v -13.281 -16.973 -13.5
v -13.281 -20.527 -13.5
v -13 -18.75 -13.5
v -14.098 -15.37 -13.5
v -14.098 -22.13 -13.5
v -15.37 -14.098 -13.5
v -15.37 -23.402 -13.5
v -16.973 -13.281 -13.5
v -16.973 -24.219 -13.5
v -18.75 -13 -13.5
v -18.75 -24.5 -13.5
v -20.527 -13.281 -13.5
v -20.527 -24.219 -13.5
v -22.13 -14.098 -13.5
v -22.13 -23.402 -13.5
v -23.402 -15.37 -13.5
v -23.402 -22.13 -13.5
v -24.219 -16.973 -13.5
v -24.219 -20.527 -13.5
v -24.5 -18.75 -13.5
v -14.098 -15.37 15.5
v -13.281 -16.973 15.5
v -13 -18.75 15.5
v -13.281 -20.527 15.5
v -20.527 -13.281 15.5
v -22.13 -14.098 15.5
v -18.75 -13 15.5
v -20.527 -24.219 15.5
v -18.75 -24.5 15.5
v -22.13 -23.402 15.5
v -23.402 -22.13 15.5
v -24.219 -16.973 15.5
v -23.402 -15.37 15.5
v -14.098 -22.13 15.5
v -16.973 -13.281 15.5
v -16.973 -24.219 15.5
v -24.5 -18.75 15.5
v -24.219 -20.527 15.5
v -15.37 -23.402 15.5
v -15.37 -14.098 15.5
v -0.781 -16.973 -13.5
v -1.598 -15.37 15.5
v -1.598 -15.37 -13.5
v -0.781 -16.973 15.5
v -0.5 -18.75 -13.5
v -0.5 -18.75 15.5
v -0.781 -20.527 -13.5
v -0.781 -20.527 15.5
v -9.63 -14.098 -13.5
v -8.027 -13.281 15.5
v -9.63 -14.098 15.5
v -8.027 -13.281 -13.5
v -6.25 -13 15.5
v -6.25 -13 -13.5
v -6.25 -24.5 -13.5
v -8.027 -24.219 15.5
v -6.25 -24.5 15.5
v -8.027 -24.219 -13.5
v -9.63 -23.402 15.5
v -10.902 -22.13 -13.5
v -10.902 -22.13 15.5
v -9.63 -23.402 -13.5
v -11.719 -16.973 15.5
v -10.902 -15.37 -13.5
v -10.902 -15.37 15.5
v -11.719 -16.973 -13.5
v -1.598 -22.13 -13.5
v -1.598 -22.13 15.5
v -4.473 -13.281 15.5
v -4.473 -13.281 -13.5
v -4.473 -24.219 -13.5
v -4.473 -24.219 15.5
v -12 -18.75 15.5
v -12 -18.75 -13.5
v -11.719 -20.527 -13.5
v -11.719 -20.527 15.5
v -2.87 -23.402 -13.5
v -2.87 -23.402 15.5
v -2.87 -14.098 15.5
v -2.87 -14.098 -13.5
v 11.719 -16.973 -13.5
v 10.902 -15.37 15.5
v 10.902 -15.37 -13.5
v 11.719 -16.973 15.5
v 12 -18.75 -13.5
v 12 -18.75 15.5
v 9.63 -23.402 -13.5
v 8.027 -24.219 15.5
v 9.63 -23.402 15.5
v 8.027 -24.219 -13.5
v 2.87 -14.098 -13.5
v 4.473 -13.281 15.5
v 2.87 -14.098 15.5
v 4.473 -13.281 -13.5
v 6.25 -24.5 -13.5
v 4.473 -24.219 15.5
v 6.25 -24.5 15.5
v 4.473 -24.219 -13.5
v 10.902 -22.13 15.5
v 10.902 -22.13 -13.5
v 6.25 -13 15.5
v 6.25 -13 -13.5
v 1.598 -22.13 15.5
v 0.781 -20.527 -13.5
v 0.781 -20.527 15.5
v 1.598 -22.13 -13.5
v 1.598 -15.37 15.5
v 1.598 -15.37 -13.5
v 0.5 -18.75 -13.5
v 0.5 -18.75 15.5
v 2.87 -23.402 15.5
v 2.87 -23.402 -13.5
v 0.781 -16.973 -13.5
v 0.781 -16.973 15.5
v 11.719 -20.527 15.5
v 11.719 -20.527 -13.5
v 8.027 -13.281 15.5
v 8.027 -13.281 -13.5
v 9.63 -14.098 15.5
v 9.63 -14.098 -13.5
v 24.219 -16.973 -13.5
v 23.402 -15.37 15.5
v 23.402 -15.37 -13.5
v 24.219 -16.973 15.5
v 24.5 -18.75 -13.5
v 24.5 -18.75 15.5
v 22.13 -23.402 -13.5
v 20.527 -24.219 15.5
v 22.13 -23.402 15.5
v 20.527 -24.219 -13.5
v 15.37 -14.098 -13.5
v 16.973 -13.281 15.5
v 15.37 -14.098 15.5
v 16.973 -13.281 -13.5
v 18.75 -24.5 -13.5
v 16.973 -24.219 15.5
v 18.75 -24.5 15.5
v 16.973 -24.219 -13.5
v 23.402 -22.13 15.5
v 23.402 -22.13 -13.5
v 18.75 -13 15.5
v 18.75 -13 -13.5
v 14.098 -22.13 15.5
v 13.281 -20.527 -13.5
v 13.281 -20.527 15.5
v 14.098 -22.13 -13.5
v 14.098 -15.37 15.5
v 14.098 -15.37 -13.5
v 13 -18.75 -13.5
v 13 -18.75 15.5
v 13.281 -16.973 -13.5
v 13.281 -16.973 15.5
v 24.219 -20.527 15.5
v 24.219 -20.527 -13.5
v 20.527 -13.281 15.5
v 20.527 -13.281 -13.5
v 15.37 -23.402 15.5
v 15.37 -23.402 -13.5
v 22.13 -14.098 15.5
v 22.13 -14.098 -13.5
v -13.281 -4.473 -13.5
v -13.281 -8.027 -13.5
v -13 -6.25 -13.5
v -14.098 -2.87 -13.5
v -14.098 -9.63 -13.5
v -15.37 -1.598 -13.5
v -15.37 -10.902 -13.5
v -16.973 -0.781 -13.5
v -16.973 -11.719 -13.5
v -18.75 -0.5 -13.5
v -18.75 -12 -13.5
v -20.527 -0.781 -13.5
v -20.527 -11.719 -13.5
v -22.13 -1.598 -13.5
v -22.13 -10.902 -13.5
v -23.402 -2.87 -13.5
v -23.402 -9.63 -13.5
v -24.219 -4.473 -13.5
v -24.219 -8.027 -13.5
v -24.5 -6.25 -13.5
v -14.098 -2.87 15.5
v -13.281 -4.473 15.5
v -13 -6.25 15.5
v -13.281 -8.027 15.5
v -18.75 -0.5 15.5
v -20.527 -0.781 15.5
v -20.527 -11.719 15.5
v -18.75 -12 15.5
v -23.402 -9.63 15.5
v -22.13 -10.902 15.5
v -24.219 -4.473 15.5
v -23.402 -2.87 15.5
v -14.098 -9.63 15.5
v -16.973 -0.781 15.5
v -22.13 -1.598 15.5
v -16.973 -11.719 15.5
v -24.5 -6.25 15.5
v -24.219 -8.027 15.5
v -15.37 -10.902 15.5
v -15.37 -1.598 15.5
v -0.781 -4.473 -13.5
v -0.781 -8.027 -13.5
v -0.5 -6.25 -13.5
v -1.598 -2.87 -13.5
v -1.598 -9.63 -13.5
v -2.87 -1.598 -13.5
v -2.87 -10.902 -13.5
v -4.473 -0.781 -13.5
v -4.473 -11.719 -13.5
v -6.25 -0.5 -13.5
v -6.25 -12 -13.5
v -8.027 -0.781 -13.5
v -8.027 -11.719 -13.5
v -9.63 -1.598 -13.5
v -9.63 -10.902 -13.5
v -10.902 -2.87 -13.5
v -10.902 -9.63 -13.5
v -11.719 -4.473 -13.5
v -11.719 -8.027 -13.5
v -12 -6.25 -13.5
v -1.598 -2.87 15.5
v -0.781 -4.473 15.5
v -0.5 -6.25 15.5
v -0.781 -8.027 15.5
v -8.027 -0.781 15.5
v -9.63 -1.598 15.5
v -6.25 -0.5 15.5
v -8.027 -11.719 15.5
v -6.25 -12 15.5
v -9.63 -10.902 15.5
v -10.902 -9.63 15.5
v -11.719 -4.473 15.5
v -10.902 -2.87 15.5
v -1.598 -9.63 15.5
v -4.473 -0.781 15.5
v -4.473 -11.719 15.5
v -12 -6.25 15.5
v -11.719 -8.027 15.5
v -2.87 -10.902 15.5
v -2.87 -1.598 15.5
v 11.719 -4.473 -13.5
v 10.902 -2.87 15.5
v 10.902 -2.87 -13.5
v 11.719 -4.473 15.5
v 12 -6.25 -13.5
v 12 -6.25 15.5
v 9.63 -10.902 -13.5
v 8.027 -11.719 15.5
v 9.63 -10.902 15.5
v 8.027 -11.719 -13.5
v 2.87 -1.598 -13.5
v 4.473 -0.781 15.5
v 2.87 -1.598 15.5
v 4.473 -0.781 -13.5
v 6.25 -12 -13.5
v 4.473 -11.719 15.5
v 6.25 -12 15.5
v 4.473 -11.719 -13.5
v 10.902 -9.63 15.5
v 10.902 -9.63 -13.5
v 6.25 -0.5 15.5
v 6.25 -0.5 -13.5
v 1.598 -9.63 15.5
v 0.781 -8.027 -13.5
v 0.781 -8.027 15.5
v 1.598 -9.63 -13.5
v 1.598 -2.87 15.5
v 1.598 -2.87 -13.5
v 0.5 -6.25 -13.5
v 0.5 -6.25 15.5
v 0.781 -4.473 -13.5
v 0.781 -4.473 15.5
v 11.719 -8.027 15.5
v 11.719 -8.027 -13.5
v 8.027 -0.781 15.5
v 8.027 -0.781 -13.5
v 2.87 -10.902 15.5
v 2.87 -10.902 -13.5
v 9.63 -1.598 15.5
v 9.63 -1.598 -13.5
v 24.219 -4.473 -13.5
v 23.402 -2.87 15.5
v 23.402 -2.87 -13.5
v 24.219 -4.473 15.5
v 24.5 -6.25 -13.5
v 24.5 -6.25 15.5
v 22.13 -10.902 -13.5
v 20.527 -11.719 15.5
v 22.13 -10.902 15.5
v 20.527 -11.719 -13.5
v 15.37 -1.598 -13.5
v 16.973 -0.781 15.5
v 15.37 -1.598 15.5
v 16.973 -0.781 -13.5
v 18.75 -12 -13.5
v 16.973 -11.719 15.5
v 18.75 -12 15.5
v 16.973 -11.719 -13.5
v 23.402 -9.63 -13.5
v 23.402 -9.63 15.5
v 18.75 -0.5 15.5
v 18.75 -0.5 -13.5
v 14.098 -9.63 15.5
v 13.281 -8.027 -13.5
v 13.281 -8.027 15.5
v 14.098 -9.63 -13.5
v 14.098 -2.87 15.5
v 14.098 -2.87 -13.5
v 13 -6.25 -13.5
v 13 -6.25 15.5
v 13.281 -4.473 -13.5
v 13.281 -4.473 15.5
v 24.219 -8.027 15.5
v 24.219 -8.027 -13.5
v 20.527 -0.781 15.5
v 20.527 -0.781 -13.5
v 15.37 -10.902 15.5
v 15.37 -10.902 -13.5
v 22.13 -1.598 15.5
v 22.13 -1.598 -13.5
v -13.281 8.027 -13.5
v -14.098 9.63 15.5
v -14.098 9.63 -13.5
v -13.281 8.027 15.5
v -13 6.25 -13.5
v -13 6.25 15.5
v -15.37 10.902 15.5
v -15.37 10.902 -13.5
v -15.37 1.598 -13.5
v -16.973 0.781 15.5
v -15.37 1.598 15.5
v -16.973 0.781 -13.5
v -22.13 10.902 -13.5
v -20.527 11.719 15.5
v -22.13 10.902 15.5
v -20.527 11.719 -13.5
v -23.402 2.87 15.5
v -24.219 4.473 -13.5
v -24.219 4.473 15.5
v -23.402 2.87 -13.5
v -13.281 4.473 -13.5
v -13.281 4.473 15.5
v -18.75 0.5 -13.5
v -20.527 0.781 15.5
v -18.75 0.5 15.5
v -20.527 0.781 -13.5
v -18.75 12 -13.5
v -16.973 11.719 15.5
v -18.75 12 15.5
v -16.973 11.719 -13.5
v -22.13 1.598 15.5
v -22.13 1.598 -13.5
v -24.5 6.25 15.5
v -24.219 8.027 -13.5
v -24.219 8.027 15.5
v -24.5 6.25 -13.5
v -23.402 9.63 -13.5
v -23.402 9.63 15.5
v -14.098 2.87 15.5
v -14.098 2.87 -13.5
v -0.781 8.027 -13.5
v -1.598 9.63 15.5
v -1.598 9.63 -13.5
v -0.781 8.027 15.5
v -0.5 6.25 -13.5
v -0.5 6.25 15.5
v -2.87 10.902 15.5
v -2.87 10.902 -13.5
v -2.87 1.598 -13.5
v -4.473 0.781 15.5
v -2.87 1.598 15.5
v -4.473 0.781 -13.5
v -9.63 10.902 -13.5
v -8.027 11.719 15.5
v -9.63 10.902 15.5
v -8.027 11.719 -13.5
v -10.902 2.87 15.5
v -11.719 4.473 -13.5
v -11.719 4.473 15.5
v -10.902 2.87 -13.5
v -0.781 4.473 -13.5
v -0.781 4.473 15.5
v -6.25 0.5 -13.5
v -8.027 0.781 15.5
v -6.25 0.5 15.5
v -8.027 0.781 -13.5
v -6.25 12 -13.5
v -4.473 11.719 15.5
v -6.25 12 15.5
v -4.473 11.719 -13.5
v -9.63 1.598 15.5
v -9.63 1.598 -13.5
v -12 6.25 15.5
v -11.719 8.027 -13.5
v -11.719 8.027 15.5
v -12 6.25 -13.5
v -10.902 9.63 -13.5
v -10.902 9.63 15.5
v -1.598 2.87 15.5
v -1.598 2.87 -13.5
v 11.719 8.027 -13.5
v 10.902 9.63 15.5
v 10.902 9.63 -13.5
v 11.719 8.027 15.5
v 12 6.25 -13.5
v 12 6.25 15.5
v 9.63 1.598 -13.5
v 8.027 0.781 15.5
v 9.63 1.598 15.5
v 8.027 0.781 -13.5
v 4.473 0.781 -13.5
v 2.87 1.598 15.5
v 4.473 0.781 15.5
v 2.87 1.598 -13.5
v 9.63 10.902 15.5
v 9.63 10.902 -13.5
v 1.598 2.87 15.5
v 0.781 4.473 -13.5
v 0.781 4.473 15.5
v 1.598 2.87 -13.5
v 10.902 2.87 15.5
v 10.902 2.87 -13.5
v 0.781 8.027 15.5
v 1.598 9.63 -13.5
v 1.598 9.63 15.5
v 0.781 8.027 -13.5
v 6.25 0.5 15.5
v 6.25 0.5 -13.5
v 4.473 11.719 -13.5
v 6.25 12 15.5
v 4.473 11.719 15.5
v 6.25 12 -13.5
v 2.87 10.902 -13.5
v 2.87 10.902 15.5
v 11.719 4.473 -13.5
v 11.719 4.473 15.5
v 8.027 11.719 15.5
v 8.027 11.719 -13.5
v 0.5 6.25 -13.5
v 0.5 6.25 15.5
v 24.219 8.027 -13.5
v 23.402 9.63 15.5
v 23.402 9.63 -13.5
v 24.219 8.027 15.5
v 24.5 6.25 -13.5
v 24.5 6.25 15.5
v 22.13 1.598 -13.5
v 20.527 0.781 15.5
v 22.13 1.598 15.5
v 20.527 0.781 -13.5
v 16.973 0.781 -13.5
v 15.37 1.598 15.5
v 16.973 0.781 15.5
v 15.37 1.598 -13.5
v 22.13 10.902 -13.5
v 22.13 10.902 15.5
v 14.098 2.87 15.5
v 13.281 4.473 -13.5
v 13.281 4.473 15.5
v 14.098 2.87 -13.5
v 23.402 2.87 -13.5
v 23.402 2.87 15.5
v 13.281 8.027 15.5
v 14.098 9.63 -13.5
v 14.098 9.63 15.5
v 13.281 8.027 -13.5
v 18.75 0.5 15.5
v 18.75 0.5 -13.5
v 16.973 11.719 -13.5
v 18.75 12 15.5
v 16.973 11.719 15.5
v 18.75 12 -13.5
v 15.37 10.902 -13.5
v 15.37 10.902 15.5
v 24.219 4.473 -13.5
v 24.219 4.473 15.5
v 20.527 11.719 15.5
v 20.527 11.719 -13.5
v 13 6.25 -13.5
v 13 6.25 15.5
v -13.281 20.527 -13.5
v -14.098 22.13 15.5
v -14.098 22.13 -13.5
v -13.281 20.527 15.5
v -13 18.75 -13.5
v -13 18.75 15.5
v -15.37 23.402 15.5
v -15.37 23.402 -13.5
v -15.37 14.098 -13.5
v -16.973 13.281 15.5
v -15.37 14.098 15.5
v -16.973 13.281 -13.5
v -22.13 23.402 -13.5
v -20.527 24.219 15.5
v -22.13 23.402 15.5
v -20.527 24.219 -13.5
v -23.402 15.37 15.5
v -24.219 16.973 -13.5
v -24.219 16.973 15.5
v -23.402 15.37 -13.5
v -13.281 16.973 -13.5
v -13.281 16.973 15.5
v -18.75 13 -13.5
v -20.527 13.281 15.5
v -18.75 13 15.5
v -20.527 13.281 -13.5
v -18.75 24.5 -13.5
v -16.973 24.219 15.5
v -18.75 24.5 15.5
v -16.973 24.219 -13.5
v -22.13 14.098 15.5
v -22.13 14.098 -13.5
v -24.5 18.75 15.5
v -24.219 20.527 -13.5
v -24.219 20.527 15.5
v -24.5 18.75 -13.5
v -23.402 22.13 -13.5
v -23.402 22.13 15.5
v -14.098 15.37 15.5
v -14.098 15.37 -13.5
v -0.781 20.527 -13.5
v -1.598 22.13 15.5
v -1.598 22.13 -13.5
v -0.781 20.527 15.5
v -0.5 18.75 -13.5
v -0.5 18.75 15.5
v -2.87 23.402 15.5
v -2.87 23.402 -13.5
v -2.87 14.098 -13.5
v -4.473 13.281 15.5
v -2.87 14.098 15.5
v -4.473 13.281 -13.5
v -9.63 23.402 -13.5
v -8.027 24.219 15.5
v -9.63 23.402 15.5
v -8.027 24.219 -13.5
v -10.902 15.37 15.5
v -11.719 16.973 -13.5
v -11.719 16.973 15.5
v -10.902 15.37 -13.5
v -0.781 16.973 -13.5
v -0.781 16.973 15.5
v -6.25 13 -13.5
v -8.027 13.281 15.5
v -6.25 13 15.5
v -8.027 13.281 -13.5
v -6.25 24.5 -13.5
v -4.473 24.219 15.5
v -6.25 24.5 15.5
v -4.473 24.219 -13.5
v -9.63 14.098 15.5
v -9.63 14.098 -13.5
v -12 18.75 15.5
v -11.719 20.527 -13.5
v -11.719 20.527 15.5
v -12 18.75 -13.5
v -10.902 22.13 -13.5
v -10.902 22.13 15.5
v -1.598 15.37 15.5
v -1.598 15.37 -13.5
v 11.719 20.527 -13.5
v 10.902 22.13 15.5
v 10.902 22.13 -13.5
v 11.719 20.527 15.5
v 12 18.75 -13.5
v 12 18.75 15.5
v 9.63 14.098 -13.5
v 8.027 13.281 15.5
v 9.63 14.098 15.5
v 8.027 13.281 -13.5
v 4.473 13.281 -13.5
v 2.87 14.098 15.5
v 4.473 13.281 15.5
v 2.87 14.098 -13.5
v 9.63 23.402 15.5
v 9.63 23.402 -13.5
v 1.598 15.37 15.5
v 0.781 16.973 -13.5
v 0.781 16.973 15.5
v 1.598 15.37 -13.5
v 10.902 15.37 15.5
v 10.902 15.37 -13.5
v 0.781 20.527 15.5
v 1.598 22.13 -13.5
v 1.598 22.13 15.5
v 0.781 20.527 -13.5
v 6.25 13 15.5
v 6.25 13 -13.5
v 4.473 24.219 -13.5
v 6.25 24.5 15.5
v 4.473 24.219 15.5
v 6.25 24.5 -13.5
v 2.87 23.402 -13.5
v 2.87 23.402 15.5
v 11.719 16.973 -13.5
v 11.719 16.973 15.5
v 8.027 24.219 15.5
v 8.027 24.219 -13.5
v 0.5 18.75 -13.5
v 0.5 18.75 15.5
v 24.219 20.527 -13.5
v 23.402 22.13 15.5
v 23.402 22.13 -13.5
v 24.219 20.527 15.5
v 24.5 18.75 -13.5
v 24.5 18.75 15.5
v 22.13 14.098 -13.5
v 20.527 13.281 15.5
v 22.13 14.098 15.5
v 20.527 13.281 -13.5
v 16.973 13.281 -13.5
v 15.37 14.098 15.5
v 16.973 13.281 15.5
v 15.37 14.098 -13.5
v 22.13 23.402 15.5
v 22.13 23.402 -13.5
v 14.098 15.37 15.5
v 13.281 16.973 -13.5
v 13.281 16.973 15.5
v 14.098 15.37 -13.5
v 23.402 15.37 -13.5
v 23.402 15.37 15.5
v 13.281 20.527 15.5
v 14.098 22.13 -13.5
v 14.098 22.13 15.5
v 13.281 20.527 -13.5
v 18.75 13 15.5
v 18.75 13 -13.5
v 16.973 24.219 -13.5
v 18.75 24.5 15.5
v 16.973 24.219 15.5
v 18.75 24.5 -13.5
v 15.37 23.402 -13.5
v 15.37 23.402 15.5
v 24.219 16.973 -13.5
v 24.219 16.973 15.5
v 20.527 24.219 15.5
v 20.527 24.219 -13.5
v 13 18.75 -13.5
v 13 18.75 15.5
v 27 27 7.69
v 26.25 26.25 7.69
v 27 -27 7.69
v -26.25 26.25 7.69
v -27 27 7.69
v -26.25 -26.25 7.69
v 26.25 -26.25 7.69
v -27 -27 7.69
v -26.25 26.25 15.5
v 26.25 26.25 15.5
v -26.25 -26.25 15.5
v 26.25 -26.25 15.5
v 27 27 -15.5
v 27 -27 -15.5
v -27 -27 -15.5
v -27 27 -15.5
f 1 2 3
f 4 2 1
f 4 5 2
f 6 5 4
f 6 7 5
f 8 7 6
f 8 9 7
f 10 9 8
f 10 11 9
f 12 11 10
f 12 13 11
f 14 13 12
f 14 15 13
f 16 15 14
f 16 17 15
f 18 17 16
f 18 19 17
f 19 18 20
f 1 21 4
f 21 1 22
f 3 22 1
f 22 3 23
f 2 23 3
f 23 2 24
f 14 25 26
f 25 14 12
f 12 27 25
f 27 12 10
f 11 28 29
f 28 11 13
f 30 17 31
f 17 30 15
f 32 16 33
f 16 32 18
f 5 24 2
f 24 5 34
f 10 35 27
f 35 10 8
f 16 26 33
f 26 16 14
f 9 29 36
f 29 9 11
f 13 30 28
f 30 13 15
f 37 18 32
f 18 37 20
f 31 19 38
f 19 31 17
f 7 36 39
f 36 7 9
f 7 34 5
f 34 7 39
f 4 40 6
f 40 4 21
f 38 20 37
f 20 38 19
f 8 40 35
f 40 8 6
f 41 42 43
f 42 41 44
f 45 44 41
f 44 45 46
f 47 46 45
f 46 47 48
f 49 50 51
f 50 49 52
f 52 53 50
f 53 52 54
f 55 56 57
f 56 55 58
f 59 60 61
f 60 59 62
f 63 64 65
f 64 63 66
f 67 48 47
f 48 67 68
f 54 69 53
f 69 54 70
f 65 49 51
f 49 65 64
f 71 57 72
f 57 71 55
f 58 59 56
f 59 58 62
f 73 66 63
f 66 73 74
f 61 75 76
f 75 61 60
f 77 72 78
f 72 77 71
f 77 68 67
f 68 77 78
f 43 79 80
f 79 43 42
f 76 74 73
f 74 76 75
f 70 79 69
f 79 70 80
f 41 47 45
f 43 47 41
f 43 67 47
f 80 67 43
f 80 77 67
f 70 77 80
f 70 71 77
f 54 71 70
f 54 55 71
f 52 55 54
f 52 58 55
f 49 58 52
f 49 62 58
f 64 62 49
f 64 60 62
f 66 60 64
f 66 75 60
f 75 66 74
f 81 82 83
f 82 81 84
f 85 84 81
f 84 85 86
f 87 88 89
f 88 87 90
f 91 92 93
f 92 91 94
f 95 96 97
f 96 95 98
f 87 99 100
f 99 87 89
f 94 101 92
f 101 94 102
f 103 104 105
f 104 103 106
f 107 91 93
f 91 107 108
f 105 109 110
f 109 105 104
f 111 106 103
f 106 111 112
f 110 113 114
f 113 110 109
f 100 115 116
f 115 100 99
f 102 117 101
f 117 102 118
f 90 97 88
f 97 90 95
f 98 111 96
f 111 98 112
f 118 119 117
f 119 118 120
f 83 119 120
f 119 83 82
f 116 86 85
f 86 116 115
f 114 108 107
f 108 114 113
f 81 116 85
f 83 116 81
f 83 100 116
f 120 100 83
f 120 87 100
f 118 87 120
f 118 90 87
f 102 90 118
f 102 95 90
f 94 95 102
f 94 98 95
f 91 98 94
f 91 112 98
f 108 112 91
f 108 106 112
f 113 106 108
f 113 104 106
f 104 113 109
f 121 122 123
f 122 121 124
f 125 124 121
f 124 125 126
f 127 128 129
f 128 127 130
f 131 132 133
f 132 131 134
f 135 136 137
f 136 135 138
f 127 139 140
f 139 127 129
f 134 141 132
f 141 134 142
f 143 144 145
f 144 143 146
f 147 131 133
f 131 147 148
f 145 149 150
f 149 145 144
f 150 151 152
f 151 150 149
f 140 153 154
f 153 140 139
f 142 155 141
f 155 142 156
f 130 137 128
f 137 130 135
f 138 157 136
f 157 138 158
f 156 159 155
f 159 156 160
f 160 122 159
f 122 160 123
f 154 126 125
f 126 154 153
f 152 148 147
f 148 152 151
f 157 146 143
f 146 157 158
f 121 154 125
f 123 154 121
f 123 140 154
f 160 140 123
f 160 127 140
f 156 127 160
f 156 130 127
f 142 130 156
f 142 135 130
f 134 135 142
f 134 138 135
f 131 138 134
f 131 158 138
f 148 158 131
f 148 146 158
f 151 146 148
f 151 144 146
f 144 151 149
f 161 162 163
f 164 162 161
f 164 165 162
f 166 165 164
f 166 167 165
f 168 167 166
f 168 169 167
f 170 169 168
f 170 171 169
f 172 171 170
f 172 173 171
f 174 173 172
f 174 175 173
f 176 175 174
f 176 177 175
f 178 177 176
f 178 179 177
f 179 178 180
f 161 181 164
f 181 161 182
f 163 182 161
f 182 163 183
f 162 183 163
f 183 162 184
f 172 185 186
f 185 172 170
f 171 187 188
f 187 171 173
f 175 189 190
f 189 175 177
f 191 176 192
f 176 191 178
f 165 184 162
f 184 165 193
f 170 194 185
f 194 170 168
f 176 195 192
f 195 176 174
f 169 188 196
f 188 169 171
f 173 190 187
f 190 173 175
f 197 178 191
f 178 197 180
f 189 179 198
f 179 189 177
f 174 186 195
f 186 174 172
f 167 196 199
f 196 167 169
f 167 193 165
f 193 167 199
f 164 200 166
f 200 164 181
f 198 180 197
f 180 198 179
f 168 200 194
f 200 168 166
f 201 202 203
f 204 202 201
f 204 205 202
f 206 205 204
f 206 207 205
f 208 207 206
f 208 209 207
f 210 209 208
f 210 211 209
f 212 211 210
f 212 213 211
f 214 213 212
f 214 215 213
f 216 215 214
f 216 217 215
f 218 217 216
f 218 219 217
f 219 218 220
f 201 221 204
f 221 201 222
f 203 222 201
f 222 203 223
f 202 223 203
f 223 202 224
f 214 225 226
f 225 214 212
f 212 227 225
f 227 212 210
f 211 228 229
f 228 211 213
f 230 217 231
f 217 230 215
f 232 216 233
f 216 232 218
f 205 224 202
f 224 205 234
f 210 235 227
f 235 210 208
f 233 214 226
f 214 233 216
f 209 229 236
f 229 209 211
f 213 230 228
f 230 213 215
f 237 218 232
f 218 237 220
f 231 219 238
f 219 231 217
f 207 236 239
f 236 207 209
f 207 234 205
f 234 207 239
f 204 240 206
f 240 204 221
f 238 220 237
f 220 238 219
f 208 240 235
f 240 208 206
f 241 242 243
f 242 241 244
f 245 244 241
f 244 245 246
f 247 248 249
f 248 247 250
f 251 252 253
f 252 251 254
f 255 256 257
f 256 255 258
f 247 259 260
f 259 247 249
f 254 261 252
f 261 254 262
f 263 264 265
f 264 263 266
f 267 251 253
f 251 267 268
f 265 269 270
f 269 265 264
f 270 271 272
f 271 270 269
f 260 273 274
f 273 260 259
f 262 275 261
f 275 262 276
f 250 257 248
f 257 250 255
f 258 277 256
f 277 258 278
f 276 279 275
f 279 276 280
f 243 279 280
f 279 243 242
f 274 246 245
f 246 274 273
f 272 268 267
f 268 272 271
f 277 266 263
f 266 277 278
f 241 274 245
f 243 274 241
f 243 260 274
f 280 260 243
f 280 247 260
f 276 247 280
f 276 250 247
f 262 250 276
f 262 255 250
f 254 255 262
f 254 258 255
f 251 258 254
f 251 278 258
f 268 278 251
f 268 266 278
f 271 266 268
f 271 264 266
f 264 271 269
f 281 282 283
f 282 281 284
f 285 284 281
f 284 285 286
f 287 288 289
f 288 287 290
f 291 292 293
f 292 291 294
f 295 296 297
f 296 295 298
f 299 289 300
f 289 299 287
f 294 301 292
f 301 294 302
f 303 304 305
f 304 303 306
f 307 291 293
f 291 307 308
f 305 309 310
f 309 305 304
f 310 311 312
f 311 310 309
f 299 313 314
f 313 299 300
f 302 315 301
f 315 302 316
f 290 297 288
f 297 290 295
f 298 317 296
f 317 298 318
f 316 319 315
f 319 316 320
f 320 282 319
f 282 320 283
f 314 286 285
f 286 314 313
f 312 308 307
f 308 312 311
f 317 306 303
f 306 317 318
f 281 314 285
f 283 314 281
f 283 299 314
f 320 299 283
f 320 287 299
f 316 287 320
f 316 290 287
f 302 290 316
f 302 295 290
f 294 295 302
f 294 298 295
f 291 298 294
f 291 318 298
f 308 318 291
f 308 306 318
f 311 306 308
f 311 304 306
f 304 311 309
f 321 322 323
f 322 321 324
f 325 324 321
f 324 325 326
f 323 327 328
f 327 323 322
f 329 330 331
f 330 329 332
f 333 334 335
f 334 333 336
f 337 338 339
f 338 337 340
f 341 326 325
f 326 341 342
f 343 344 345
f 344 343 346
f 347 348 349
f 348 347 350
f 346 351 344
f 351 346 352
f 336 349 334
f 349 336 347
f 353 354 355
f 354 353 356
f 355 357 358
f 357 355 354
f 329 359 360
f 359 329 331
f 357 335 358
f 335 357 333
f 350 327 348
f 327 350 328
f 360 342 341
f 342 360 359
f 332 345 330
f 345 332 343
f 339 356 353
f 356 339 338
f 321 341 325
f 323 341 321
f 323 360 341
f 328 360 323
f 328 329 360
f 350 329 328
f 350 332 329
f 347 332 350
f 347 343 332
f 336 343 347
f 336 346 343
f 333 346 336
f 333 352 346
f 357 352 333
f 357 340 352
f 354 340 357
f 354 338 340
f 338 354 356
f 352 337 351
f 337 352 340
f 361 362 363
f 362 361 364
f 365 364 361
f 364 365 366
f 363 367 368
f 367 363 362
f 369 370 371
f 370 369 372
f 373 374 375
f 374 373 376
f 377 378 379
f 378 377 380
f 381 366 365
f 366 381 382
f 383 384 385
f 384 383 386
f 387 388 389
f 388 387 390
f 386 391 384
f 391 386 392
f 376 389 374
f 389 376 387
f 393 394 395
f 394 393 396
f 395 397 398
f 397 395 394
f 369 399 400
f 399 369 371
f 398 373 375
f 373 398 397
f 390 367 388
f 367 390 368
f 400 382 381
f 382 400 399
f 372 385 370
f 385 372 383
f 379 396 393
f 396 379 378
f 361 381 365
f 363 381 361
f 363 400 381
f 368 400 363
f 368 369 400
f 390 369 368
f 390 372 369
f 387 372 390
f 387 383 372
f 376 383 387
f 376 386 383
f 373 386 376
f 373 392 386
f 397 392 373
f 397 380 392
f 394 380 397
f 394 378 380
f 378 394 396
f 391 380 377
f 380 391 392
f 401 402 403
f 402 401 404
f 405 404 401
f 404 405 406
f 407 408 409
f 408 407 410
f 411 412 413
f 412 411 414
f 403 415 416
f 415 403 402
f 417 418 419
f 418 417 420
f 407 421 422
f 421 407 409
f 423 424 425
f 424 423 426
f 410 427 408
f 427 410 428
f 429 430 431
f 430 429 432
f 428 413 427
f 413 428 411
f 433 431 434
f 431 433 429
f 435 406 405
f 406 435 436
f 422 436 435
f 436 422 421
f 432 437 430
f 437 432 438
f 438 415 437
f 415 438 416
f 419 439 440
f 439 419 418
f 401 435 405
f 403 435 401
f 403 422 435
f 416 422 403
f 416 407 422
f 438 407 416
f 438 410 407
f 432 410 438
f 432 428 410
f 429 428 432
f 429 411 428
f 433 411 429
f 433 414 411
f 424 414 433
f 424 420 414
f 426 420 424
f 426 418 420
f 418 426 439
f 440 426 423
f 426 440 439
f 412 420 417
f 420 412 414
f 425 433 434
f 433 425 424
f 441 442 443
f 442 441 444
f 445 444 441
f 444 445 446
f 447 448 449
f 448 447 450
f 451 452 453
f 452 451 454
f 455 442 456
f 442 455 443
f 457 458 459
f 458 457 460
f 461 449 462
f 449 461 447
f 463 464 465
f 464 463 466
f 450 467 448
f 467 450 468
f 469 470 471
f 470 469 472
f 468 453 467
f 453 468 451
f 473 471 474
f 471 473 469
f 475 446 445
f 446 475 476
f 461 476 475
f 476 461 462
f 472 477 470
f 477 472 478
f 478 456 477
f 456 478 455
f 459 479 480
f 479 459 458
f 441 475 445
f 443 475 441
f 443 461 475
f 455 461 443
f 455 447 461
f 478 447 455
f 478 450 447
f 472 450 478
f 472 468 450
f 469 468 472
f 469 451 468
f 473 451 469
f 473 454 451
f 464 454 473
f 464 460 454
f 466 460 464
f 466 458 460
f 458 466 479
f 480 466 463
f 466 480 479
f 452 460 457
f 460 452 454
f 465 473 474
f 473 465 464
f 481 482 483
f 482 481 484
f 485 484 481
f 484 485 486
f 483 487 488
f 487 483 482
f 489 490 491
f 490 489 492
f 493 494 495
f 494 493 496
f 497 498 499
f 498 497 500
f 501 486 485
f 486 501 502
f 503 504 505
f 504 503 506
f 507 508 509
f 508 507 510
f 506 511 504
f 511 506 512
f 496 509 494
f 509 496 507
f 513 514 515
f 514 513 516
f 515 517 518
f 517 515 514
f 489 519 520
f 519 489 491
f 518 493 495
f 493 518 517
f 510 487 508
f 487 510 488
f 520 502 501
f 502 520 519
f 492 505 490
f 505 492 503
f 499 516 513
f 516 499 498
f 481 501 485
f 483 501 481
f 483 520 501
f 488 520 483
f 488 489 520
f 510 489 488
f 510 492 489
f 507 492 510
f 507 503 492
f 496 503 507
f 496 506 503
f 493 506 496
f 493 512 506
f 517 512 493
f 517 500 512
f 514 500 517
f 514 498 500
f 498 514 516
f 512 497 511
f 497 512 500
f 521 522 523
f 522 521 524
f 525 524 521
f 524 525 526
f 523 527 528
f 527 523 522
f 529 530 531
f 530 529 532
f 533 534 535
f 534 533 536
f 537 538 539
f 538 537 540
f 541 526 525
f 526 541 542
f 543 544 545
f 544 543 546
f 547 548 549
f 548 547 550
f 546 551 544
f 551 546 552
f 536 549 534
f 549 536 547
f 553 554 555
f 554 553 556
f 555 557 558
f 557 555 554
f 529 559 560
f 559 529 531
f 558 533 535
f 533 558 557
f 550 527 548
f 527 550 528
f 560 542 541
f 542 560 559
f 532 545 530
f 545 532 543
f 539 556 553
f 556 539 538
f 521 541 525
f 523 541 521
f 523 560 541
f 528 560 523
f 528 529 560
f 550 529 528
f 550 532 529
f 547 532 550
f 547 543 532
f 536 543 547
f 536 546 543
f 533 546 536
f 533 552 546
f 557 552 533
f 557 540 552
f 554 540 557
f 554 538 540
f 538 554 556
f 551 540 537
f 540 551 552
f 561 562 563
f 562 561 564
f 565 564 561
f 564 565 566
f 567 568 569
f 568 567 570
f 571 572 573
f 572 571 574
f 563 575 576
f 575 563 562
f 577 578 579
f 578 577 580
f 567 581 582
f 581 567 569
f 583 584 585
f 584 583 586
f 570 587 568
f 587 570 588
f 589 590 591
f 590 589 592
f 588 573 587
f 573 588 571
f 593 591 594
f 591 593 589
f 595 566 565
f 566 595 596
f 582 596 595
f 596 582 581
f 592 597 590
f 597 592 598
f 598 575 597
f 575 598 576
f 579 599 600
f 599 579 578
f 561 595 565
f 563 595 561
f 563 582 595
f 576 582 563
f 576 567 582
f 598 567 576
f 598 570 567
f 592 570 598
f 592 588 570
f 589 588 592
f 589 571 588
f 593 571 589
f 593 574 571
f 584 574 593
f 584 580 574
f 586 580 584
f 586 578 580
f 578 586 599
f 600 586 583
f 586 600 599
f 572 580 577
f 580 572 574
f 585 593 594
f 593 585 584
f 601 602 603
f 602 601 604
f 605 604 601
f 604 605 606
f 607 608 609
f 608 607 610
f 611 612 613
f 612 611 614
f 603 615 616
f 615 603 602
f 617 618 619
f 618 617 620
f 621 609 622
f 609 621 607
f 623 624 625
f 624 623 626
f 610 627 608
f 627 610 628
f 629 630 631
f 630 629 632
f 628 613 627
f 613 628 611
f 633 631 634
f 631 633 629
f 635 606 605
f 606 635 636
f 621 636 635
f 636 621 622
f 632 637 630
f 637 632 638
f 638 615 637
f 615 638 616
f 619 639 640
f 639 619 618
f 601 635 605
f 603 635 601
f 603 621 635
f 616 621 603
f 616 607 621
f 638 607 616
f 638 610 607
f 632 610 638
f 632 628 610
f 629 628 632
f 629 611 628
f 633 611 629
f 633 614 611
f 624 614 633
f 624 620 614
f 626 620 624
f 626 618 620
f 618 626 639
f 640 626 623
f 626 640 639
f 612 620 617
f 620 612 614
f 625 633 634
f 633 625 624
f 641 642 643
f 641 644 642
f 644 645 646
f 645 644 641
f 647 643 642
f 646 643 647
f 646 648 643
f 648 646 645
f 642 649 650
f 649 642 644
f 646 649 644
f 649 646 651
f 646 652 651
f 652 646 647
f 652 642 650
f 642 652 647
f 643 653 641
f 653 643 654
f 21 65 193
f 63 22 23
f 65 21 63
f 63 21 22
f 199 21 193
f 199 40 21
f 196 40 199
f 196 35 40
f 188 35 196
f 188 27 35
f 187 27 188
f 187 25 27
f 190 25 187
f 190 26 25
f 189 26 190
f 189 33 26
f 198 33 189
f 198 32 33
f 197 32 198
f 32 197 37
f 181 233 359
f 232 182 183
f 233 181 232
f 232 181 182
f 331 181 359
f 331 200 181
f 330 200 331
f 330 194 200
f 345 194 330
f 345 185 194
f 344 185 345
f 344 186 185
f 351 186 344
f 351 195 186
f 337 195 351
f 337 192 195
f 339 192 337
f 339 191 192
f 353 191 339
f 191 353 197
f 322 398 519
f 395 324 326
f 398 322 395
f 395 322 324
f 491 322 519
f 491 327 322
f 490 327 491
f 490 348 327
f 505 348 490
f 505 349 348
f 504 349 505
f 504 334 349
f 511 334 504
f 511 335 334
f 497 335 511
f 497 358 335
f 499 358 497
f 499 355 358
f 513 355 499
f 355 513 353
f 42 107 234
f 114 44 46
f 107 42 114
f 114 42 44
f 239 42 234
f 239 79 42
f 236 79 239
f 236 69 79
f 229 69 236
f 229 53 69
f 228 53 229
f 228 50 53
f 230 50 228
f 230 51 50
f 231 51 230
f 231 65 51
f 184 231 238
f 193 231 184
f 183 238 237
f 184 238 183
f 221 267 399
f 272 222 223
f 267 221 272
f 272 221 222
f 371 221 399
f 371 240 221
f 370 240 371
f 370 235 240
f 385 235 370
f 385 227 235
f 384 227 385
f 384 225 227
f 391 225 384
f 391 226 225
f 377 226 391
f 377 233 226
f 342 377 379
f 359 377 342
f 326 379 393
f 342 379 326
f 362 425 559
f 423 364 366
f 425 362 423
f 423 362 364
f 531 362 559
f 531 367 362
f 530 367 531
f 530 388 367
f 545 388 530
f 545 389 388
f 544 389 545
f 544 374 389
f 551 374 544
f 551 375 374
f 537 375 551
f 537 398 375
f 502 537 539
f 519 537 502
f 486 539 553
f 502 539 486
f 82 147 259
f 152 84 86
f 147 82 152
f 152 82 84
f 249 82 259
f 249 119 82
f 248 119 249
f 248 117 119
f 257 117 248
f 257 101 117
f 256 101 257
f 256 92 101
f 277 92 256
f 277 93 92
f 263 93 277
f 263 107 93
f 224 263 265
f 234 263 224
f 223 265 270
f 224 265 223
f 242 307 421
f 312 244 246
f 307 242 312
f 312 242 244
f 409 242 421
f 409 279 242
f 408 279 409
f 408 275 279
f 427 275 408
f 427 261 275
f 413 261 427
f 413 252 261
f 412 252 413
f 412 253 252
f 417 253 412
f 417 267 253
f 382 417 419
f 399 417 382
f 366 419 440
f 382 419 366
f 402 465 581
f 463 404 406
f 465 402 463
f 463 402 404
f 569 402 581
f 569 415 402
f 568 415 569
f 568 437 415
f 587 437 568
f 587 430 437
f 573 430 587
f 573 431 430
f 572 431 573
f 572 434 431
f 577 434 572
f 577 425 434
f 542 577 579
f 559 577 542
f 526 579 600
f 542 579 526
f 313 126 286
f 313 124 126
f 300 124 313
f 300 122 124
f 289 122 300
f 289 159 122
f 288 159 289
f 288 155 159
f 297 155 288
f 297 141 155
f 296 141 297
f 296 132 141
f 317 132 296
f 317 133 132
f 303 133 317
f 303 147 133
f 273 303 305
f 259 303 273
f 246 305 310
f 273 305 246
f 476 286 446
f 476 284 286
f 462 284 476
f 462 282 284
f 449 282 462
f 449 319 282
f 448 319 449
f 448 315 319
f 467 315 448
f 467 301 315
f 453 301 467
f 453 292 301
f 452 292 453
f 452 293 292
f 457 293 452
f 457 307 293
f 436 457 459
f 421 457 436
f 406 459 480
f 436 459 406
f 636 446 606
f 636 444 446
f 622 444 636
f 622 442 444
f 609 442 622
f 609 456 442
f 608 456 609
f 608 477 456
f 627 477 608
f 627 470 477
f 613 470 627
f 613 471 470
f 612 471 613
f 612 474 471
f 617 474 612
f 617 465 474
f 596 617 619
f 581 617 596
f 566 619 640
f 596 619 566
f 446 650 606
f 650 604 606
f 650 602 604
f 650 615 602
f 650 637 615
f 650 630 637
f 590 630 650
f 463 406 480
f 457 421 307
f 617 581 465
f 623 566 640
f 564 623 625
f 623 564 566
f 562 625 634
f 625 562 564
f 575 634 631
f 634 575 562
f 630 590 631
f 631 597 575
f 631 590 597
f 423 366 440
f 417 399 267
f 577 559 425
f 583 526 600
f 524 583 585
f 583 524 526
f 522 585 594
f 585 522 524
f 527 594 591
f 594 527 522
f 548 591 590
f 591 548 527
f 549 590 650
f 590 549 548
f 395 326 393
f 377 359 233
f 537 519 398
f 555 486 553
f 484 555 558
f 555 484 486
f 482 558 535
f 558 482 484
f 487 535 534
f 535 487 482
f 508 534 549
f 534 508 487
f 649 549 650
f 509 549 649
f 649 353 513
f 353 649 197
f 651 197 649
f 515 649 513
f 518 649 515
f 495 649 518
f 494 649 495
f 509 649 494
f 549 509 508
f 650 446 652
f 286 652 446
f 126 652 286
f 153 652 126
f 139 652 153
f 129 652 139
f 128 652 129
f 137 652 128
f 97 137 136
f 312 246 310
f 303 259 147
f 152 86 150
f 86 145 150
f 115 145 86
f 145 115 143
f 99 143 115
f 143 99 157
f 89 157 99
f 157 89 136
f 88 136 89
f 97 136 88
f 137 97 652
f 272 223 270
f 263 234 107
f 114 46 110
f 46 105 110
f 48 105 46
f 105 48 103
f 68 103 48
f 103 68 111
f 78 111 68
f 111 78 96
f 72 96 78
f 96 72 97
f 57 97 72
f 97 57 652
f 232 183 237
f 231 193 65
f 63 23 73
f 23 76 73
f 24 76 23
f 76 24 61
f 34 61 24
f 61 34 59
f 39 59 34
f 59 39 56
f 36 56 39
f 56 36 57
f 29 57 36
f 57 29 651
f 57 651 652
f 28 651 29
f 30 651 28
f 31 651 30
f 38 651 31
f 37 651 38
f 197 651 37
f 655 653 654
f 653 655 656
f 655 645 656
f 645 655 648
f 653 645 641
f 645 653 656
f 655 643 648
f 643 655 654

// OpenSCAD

height=31;		//box height
diam=11.5;		//battery diameter 
rows=4;
spacing=1;
width=(diam+spacing)*rows+4;


   difference()
  {
			 intersection()
      {
			cube([width,width,height], center = true);
		}

for ( j = [(-width/2)+(width-rows*(diam+spacing))/2+(diam+spacing)/2: diam+spacing : ((width/2))] )
	{
		for ( i = [(-width/2)+(width-rows*(diam+spacing))/2+(diam+spacing)/2 : diam+spacing : ((width/2))] )
		{
			translate([i , j, 2]) cylinder(h = height, r = diam/2, center = true, $fn=20 );
		}
	}
		for ( k = [0 : 3] )
		{
			 rotate([0, 0, k * 90])
				translate([width/2 , width/2, height/2-8/2.1])cube([width*2,1.5,8], center = true);
		}
}
